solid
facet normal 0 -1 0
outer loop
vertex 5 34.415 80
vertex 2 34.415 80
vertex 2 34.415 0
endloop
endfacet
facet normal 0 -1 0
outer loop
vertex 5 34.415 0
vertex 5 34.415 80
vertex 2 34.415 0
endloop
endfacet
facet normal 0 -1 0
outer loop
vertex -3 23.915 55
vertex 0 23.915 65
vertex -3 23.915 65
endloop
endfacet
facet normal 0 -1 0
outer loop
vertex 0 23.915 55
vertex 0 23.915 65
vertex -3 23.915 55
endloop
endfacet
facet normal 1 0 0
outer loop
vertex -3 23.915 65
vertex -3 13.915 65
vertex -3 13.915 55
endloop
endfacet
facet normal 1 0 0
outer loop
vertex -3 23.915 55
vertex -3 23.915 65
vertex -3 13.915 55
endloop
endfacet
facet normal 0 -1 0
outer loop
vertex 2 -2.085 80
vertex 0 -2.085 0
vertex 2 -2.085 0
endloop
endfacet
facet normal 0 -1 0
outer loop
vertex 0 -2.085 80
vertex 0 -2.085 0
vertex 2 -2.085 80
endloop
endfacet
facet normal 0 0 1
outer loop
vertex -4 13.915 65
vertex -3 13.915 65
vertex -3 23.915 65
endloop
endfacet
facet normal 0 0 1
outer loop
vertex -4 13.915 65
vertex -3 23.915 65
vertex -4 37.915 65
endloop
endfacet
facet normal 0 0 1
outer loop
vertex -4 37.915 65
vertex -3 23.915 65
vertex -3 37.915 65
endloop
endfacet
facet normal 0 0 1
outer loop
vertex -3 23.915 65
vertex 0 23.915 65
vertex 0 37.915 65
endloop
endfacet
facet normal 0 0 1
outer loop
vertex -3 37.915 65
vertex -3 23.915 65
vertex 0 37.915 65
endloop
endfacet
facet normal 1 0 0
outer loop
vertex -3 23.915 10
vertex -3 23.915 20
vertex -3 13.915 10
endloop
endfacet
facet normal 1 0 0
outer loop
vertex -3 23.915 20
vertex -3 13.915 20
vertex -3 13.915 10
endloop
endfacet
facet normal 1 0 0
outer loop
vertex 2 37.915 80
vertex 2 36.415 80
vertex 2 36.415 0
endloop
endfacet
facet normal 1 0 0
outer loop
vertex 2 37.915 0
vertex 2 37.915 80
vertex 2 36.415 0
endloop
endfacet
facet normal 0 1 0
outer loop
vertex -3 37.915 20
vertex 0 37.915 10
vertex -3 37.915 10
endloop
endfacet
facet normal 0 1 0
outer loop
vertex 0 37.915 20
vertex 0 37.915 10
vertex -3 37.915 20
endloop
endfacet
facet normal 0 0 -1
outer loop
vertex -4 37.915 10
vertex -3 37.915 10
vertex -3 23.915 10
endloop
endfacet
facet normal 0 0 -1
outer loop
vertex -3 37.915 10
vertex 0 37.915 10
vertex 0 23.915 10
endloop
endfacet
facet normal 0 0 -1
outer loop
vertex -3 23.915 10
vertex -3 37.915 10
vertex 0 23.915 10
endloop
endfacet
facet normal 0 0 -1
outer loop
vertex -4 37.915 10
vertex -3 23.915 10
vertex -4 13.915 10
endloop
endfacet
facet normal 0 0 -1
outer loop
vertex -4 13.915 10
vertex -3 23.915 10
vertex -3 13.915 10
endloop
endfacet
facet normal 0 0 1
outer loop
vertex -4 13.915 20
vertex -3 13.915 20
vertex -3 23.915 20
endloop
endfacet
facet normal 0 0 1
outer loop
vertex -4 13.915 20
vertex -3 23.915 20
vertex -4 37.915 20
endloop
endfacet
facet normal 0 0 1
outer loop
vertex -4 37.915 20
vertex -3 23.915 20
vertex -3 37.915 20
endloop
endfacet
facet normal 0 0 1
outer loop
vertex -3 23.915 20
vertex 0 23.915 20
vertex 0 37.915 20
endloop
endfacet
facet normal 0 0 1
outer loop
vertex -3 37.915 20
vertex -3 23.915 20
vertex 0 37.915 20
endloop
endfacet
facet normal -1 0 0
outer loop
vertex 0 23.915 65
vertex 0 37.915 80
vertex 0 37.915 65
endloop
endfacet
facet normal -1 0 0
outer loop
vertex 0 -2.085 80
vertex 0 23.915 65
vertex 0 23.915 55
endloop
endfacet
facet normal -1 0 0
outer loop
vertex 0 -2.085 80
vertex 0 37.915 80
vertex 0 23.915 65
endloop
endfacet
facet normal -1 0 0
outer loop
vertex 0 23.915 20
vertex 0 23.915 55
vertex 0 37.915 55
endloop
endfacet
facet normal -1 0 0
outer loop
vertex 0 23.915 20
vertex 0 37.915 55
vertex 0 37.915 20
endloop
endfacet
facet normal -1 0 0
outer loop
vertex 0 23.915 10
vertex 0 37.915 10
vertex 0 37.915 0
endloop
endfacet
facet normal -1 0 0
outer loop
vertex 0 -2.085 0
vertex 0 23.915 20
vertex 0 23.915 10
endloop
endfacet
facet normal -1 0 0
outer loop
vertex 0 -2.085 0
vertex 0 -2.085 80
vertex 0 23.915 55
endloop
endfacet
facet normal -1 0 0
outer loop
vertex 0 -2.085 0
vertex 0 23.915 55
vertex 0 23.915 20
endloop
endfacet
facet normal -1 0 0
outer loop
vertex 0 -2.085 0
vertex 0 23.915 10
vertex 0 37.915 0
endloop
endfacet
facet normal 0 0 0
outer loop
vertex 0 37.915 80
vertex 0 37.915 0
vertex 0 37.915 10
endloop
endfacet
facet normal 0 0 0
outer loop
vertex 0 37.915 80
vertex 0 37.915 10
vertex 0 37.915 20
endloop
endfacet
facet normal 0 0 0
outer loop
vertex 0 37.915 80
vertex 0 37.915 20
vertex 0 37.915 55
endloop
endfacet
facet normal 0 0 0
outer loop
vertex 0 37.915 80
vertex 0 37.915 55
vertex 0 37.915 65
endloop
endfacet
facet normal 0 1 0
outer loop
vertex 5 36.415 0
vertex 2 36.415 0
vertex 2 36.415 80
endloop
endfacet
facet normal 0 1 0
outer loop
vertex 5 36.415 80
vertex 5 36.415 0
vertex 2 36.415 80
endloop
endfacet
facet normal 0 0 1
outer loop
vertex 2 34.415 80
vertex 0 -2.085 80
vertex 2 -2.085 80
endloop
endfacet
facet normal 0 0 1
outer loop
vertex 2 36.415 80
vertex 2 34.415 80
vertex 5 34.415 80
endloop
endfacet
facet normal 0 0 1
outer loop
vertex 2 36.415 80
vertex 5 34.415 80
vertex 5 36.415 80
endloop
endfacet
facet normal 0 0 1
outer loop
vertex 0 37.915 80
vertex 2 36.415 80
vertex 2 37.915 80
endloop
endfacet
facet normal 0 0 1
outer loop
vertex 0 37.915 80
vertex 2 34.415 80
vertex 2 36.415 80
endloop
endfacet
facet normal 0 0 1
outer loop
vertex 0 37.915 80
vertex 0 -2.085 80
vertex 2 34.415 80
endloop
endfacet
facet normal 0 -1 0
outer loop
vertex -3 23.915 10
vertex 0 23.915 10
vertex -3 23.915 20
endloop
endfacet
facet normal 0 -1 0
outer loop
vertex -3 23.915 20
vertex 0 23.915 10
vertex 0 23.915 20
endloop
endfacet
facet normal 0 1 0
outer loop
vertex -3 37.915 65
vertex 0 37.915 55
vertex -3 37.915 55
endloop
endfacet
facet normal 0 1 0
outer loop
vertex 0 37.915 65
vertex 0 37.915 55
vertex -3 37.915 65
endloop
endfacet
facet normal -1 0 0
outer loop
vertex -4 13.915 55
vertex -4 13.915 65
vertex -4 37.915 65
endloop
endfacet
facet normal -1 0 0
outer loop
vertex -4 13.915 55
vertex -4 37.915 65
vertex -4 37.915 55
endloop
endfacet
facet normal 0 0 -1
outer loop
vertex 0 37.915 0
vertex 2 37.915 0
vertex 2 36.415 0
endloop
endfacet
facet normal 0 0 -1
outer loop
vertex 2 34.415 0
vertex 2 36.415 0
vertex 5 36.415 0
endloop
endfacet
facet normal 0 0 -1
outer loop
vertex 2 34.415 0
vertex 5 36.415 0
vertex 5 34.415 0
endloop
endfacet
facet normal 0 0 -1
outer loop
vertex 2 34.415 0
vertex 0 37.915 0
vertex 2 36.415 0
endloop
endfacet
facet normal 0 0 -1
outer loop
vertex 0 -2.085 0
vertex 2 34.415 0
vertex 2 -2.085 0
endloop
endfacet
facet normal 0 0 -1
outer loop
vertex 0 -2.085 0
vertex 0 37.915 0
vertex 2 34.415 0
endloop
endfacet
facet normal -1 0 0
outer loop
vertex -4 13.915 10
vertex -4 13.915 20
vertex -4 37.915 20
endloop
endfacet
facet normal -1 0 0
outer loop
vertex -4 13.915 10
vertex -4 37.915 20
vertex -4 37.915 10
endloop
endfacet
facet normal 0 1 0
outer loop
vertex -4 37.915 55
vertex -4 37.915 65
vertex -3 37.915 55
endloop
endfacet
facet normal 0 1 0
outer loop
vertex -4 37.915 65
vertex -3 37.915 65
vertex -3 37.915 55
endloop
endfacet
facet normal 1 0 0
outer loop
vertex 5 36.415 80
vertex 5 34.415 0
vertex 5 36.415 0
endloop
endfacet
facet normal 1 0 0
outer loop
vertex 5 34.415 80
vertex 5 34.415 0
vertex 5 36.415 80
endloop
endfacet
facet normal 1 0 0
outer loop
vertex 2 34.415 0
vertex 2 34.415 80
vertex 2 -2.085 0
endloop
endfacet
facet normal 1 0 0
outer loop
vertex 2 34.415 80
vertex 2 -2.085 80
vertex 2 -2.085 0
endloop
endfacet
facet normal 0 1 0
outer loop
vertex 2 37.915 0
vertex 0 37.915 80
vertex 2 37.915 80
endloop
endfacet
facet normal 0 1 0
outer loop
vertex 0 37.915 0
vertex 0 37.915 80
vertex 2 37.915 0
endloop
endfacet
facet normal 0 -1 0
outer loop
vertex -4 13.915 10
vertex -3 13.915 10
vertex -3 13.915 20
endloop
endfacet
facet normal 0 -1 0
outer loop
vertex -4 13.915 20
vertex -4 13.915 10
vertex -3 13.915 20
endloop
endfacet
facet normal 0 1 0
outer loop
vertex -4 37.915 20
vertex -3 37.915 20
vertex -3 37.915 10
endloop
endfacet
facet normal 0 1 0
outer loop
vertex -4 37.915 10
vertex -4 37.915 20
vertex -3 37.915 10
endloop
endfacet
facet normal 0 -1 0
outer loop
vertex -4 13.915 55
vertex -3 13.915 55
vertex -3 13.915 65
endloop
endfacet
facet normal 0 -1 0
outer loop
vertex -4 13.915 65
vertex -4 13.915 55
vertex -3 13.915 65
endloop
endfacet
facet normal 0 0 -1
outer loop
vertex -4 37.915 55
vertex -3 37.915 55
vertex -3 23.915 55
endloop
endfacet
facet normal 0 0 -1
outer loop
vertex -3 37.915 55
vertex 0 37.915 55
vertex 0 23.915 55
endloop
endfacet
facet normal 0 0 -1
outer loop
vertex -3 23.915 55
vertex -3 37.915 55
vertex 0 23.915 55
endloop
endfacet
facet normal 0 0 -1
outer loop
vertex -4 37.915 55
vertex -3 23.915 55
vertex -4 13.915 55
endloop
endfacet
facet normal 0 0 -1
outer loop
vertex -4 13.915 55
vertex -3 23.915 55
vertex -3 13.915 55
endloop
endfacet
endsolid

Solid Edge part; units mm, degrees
sketch "Sketch1" plane through (0, 0, 0) normal (-1, 0, 0) x (0, -1, 0)
  line L0 (2.0853, 0) -> (2.0853, 80)
  line L1 (2.0853, 80) -> (-37.9147, 80)
  line L2 (-37.9147, 80) -> (-37.9147, 0)
  line L3 (-37.9147, 0) -> (2.0853, 0)
extrude "Protrusion1" add sketch "Sketch1" against normal blind 2
sketch "Sketch2" plane through (0, 18.9573, 40) normal (-1, 0, 0) x (0, 0, 1)
  line L0 (-20, 4.9573) -> (-20, 18.9573)
  line L1 (-30, 18.9573) -> (-20, 18.9573)
  line L2 (-30, 18.9573) -> (-30, 4.9573)
  line L3 (-30, 4.9573) -> (-20, 4.9573)
  line L4 (25, 18.9573) -> (25, 4.9573)
  line L5 (25, 4.9573) -> (15, 4.9573)
  line L6 (15, 4.9573) -> (15, 18.9573)
  line L7 (15, 18.9573) -> (25, 18.9573)
extrude "Vysunutí_2" add sketch "Sketch2" along normal blind 3
sketch "Sketch3" plane through (-3, 30.9147, 60) normal (-1, 0, 0) x (0, 0, 1)
  line L0 (5, -17) -> (5, 7)
  line L1 (5, 7) -> (-5, 7)
  line L2 (-5, 7) -> (-5, -17)
  line L3 (-5, -17) -> (5, -17)
  line L4 (-40, -17) -> (-40, 7)
  line L5 (-40, 7) -> (-50, 7)
  line L6 (-50, 7) -> (-50, -17)
  line L7 (-50, -17) -> (-40, -17)
extrude "Vysunutí_3" add sketch "Sketch3" along normal blind 1
sketch "Sketch4" plane through (2, 17.9147, 40) normal (1, 0, 0) x (0, 0, 1)
  line L0 (-40, -18.5) -> (40, -18.5)
  line L1 (40, -18.5) -> (40, -16.5)
  line L2 (40, -16.5) -> (-40, -16.5)
extrude "Vysunutí_4" add sketch "Sketch4" along normal blind 3 material side at (2, 36.3647, 40)
